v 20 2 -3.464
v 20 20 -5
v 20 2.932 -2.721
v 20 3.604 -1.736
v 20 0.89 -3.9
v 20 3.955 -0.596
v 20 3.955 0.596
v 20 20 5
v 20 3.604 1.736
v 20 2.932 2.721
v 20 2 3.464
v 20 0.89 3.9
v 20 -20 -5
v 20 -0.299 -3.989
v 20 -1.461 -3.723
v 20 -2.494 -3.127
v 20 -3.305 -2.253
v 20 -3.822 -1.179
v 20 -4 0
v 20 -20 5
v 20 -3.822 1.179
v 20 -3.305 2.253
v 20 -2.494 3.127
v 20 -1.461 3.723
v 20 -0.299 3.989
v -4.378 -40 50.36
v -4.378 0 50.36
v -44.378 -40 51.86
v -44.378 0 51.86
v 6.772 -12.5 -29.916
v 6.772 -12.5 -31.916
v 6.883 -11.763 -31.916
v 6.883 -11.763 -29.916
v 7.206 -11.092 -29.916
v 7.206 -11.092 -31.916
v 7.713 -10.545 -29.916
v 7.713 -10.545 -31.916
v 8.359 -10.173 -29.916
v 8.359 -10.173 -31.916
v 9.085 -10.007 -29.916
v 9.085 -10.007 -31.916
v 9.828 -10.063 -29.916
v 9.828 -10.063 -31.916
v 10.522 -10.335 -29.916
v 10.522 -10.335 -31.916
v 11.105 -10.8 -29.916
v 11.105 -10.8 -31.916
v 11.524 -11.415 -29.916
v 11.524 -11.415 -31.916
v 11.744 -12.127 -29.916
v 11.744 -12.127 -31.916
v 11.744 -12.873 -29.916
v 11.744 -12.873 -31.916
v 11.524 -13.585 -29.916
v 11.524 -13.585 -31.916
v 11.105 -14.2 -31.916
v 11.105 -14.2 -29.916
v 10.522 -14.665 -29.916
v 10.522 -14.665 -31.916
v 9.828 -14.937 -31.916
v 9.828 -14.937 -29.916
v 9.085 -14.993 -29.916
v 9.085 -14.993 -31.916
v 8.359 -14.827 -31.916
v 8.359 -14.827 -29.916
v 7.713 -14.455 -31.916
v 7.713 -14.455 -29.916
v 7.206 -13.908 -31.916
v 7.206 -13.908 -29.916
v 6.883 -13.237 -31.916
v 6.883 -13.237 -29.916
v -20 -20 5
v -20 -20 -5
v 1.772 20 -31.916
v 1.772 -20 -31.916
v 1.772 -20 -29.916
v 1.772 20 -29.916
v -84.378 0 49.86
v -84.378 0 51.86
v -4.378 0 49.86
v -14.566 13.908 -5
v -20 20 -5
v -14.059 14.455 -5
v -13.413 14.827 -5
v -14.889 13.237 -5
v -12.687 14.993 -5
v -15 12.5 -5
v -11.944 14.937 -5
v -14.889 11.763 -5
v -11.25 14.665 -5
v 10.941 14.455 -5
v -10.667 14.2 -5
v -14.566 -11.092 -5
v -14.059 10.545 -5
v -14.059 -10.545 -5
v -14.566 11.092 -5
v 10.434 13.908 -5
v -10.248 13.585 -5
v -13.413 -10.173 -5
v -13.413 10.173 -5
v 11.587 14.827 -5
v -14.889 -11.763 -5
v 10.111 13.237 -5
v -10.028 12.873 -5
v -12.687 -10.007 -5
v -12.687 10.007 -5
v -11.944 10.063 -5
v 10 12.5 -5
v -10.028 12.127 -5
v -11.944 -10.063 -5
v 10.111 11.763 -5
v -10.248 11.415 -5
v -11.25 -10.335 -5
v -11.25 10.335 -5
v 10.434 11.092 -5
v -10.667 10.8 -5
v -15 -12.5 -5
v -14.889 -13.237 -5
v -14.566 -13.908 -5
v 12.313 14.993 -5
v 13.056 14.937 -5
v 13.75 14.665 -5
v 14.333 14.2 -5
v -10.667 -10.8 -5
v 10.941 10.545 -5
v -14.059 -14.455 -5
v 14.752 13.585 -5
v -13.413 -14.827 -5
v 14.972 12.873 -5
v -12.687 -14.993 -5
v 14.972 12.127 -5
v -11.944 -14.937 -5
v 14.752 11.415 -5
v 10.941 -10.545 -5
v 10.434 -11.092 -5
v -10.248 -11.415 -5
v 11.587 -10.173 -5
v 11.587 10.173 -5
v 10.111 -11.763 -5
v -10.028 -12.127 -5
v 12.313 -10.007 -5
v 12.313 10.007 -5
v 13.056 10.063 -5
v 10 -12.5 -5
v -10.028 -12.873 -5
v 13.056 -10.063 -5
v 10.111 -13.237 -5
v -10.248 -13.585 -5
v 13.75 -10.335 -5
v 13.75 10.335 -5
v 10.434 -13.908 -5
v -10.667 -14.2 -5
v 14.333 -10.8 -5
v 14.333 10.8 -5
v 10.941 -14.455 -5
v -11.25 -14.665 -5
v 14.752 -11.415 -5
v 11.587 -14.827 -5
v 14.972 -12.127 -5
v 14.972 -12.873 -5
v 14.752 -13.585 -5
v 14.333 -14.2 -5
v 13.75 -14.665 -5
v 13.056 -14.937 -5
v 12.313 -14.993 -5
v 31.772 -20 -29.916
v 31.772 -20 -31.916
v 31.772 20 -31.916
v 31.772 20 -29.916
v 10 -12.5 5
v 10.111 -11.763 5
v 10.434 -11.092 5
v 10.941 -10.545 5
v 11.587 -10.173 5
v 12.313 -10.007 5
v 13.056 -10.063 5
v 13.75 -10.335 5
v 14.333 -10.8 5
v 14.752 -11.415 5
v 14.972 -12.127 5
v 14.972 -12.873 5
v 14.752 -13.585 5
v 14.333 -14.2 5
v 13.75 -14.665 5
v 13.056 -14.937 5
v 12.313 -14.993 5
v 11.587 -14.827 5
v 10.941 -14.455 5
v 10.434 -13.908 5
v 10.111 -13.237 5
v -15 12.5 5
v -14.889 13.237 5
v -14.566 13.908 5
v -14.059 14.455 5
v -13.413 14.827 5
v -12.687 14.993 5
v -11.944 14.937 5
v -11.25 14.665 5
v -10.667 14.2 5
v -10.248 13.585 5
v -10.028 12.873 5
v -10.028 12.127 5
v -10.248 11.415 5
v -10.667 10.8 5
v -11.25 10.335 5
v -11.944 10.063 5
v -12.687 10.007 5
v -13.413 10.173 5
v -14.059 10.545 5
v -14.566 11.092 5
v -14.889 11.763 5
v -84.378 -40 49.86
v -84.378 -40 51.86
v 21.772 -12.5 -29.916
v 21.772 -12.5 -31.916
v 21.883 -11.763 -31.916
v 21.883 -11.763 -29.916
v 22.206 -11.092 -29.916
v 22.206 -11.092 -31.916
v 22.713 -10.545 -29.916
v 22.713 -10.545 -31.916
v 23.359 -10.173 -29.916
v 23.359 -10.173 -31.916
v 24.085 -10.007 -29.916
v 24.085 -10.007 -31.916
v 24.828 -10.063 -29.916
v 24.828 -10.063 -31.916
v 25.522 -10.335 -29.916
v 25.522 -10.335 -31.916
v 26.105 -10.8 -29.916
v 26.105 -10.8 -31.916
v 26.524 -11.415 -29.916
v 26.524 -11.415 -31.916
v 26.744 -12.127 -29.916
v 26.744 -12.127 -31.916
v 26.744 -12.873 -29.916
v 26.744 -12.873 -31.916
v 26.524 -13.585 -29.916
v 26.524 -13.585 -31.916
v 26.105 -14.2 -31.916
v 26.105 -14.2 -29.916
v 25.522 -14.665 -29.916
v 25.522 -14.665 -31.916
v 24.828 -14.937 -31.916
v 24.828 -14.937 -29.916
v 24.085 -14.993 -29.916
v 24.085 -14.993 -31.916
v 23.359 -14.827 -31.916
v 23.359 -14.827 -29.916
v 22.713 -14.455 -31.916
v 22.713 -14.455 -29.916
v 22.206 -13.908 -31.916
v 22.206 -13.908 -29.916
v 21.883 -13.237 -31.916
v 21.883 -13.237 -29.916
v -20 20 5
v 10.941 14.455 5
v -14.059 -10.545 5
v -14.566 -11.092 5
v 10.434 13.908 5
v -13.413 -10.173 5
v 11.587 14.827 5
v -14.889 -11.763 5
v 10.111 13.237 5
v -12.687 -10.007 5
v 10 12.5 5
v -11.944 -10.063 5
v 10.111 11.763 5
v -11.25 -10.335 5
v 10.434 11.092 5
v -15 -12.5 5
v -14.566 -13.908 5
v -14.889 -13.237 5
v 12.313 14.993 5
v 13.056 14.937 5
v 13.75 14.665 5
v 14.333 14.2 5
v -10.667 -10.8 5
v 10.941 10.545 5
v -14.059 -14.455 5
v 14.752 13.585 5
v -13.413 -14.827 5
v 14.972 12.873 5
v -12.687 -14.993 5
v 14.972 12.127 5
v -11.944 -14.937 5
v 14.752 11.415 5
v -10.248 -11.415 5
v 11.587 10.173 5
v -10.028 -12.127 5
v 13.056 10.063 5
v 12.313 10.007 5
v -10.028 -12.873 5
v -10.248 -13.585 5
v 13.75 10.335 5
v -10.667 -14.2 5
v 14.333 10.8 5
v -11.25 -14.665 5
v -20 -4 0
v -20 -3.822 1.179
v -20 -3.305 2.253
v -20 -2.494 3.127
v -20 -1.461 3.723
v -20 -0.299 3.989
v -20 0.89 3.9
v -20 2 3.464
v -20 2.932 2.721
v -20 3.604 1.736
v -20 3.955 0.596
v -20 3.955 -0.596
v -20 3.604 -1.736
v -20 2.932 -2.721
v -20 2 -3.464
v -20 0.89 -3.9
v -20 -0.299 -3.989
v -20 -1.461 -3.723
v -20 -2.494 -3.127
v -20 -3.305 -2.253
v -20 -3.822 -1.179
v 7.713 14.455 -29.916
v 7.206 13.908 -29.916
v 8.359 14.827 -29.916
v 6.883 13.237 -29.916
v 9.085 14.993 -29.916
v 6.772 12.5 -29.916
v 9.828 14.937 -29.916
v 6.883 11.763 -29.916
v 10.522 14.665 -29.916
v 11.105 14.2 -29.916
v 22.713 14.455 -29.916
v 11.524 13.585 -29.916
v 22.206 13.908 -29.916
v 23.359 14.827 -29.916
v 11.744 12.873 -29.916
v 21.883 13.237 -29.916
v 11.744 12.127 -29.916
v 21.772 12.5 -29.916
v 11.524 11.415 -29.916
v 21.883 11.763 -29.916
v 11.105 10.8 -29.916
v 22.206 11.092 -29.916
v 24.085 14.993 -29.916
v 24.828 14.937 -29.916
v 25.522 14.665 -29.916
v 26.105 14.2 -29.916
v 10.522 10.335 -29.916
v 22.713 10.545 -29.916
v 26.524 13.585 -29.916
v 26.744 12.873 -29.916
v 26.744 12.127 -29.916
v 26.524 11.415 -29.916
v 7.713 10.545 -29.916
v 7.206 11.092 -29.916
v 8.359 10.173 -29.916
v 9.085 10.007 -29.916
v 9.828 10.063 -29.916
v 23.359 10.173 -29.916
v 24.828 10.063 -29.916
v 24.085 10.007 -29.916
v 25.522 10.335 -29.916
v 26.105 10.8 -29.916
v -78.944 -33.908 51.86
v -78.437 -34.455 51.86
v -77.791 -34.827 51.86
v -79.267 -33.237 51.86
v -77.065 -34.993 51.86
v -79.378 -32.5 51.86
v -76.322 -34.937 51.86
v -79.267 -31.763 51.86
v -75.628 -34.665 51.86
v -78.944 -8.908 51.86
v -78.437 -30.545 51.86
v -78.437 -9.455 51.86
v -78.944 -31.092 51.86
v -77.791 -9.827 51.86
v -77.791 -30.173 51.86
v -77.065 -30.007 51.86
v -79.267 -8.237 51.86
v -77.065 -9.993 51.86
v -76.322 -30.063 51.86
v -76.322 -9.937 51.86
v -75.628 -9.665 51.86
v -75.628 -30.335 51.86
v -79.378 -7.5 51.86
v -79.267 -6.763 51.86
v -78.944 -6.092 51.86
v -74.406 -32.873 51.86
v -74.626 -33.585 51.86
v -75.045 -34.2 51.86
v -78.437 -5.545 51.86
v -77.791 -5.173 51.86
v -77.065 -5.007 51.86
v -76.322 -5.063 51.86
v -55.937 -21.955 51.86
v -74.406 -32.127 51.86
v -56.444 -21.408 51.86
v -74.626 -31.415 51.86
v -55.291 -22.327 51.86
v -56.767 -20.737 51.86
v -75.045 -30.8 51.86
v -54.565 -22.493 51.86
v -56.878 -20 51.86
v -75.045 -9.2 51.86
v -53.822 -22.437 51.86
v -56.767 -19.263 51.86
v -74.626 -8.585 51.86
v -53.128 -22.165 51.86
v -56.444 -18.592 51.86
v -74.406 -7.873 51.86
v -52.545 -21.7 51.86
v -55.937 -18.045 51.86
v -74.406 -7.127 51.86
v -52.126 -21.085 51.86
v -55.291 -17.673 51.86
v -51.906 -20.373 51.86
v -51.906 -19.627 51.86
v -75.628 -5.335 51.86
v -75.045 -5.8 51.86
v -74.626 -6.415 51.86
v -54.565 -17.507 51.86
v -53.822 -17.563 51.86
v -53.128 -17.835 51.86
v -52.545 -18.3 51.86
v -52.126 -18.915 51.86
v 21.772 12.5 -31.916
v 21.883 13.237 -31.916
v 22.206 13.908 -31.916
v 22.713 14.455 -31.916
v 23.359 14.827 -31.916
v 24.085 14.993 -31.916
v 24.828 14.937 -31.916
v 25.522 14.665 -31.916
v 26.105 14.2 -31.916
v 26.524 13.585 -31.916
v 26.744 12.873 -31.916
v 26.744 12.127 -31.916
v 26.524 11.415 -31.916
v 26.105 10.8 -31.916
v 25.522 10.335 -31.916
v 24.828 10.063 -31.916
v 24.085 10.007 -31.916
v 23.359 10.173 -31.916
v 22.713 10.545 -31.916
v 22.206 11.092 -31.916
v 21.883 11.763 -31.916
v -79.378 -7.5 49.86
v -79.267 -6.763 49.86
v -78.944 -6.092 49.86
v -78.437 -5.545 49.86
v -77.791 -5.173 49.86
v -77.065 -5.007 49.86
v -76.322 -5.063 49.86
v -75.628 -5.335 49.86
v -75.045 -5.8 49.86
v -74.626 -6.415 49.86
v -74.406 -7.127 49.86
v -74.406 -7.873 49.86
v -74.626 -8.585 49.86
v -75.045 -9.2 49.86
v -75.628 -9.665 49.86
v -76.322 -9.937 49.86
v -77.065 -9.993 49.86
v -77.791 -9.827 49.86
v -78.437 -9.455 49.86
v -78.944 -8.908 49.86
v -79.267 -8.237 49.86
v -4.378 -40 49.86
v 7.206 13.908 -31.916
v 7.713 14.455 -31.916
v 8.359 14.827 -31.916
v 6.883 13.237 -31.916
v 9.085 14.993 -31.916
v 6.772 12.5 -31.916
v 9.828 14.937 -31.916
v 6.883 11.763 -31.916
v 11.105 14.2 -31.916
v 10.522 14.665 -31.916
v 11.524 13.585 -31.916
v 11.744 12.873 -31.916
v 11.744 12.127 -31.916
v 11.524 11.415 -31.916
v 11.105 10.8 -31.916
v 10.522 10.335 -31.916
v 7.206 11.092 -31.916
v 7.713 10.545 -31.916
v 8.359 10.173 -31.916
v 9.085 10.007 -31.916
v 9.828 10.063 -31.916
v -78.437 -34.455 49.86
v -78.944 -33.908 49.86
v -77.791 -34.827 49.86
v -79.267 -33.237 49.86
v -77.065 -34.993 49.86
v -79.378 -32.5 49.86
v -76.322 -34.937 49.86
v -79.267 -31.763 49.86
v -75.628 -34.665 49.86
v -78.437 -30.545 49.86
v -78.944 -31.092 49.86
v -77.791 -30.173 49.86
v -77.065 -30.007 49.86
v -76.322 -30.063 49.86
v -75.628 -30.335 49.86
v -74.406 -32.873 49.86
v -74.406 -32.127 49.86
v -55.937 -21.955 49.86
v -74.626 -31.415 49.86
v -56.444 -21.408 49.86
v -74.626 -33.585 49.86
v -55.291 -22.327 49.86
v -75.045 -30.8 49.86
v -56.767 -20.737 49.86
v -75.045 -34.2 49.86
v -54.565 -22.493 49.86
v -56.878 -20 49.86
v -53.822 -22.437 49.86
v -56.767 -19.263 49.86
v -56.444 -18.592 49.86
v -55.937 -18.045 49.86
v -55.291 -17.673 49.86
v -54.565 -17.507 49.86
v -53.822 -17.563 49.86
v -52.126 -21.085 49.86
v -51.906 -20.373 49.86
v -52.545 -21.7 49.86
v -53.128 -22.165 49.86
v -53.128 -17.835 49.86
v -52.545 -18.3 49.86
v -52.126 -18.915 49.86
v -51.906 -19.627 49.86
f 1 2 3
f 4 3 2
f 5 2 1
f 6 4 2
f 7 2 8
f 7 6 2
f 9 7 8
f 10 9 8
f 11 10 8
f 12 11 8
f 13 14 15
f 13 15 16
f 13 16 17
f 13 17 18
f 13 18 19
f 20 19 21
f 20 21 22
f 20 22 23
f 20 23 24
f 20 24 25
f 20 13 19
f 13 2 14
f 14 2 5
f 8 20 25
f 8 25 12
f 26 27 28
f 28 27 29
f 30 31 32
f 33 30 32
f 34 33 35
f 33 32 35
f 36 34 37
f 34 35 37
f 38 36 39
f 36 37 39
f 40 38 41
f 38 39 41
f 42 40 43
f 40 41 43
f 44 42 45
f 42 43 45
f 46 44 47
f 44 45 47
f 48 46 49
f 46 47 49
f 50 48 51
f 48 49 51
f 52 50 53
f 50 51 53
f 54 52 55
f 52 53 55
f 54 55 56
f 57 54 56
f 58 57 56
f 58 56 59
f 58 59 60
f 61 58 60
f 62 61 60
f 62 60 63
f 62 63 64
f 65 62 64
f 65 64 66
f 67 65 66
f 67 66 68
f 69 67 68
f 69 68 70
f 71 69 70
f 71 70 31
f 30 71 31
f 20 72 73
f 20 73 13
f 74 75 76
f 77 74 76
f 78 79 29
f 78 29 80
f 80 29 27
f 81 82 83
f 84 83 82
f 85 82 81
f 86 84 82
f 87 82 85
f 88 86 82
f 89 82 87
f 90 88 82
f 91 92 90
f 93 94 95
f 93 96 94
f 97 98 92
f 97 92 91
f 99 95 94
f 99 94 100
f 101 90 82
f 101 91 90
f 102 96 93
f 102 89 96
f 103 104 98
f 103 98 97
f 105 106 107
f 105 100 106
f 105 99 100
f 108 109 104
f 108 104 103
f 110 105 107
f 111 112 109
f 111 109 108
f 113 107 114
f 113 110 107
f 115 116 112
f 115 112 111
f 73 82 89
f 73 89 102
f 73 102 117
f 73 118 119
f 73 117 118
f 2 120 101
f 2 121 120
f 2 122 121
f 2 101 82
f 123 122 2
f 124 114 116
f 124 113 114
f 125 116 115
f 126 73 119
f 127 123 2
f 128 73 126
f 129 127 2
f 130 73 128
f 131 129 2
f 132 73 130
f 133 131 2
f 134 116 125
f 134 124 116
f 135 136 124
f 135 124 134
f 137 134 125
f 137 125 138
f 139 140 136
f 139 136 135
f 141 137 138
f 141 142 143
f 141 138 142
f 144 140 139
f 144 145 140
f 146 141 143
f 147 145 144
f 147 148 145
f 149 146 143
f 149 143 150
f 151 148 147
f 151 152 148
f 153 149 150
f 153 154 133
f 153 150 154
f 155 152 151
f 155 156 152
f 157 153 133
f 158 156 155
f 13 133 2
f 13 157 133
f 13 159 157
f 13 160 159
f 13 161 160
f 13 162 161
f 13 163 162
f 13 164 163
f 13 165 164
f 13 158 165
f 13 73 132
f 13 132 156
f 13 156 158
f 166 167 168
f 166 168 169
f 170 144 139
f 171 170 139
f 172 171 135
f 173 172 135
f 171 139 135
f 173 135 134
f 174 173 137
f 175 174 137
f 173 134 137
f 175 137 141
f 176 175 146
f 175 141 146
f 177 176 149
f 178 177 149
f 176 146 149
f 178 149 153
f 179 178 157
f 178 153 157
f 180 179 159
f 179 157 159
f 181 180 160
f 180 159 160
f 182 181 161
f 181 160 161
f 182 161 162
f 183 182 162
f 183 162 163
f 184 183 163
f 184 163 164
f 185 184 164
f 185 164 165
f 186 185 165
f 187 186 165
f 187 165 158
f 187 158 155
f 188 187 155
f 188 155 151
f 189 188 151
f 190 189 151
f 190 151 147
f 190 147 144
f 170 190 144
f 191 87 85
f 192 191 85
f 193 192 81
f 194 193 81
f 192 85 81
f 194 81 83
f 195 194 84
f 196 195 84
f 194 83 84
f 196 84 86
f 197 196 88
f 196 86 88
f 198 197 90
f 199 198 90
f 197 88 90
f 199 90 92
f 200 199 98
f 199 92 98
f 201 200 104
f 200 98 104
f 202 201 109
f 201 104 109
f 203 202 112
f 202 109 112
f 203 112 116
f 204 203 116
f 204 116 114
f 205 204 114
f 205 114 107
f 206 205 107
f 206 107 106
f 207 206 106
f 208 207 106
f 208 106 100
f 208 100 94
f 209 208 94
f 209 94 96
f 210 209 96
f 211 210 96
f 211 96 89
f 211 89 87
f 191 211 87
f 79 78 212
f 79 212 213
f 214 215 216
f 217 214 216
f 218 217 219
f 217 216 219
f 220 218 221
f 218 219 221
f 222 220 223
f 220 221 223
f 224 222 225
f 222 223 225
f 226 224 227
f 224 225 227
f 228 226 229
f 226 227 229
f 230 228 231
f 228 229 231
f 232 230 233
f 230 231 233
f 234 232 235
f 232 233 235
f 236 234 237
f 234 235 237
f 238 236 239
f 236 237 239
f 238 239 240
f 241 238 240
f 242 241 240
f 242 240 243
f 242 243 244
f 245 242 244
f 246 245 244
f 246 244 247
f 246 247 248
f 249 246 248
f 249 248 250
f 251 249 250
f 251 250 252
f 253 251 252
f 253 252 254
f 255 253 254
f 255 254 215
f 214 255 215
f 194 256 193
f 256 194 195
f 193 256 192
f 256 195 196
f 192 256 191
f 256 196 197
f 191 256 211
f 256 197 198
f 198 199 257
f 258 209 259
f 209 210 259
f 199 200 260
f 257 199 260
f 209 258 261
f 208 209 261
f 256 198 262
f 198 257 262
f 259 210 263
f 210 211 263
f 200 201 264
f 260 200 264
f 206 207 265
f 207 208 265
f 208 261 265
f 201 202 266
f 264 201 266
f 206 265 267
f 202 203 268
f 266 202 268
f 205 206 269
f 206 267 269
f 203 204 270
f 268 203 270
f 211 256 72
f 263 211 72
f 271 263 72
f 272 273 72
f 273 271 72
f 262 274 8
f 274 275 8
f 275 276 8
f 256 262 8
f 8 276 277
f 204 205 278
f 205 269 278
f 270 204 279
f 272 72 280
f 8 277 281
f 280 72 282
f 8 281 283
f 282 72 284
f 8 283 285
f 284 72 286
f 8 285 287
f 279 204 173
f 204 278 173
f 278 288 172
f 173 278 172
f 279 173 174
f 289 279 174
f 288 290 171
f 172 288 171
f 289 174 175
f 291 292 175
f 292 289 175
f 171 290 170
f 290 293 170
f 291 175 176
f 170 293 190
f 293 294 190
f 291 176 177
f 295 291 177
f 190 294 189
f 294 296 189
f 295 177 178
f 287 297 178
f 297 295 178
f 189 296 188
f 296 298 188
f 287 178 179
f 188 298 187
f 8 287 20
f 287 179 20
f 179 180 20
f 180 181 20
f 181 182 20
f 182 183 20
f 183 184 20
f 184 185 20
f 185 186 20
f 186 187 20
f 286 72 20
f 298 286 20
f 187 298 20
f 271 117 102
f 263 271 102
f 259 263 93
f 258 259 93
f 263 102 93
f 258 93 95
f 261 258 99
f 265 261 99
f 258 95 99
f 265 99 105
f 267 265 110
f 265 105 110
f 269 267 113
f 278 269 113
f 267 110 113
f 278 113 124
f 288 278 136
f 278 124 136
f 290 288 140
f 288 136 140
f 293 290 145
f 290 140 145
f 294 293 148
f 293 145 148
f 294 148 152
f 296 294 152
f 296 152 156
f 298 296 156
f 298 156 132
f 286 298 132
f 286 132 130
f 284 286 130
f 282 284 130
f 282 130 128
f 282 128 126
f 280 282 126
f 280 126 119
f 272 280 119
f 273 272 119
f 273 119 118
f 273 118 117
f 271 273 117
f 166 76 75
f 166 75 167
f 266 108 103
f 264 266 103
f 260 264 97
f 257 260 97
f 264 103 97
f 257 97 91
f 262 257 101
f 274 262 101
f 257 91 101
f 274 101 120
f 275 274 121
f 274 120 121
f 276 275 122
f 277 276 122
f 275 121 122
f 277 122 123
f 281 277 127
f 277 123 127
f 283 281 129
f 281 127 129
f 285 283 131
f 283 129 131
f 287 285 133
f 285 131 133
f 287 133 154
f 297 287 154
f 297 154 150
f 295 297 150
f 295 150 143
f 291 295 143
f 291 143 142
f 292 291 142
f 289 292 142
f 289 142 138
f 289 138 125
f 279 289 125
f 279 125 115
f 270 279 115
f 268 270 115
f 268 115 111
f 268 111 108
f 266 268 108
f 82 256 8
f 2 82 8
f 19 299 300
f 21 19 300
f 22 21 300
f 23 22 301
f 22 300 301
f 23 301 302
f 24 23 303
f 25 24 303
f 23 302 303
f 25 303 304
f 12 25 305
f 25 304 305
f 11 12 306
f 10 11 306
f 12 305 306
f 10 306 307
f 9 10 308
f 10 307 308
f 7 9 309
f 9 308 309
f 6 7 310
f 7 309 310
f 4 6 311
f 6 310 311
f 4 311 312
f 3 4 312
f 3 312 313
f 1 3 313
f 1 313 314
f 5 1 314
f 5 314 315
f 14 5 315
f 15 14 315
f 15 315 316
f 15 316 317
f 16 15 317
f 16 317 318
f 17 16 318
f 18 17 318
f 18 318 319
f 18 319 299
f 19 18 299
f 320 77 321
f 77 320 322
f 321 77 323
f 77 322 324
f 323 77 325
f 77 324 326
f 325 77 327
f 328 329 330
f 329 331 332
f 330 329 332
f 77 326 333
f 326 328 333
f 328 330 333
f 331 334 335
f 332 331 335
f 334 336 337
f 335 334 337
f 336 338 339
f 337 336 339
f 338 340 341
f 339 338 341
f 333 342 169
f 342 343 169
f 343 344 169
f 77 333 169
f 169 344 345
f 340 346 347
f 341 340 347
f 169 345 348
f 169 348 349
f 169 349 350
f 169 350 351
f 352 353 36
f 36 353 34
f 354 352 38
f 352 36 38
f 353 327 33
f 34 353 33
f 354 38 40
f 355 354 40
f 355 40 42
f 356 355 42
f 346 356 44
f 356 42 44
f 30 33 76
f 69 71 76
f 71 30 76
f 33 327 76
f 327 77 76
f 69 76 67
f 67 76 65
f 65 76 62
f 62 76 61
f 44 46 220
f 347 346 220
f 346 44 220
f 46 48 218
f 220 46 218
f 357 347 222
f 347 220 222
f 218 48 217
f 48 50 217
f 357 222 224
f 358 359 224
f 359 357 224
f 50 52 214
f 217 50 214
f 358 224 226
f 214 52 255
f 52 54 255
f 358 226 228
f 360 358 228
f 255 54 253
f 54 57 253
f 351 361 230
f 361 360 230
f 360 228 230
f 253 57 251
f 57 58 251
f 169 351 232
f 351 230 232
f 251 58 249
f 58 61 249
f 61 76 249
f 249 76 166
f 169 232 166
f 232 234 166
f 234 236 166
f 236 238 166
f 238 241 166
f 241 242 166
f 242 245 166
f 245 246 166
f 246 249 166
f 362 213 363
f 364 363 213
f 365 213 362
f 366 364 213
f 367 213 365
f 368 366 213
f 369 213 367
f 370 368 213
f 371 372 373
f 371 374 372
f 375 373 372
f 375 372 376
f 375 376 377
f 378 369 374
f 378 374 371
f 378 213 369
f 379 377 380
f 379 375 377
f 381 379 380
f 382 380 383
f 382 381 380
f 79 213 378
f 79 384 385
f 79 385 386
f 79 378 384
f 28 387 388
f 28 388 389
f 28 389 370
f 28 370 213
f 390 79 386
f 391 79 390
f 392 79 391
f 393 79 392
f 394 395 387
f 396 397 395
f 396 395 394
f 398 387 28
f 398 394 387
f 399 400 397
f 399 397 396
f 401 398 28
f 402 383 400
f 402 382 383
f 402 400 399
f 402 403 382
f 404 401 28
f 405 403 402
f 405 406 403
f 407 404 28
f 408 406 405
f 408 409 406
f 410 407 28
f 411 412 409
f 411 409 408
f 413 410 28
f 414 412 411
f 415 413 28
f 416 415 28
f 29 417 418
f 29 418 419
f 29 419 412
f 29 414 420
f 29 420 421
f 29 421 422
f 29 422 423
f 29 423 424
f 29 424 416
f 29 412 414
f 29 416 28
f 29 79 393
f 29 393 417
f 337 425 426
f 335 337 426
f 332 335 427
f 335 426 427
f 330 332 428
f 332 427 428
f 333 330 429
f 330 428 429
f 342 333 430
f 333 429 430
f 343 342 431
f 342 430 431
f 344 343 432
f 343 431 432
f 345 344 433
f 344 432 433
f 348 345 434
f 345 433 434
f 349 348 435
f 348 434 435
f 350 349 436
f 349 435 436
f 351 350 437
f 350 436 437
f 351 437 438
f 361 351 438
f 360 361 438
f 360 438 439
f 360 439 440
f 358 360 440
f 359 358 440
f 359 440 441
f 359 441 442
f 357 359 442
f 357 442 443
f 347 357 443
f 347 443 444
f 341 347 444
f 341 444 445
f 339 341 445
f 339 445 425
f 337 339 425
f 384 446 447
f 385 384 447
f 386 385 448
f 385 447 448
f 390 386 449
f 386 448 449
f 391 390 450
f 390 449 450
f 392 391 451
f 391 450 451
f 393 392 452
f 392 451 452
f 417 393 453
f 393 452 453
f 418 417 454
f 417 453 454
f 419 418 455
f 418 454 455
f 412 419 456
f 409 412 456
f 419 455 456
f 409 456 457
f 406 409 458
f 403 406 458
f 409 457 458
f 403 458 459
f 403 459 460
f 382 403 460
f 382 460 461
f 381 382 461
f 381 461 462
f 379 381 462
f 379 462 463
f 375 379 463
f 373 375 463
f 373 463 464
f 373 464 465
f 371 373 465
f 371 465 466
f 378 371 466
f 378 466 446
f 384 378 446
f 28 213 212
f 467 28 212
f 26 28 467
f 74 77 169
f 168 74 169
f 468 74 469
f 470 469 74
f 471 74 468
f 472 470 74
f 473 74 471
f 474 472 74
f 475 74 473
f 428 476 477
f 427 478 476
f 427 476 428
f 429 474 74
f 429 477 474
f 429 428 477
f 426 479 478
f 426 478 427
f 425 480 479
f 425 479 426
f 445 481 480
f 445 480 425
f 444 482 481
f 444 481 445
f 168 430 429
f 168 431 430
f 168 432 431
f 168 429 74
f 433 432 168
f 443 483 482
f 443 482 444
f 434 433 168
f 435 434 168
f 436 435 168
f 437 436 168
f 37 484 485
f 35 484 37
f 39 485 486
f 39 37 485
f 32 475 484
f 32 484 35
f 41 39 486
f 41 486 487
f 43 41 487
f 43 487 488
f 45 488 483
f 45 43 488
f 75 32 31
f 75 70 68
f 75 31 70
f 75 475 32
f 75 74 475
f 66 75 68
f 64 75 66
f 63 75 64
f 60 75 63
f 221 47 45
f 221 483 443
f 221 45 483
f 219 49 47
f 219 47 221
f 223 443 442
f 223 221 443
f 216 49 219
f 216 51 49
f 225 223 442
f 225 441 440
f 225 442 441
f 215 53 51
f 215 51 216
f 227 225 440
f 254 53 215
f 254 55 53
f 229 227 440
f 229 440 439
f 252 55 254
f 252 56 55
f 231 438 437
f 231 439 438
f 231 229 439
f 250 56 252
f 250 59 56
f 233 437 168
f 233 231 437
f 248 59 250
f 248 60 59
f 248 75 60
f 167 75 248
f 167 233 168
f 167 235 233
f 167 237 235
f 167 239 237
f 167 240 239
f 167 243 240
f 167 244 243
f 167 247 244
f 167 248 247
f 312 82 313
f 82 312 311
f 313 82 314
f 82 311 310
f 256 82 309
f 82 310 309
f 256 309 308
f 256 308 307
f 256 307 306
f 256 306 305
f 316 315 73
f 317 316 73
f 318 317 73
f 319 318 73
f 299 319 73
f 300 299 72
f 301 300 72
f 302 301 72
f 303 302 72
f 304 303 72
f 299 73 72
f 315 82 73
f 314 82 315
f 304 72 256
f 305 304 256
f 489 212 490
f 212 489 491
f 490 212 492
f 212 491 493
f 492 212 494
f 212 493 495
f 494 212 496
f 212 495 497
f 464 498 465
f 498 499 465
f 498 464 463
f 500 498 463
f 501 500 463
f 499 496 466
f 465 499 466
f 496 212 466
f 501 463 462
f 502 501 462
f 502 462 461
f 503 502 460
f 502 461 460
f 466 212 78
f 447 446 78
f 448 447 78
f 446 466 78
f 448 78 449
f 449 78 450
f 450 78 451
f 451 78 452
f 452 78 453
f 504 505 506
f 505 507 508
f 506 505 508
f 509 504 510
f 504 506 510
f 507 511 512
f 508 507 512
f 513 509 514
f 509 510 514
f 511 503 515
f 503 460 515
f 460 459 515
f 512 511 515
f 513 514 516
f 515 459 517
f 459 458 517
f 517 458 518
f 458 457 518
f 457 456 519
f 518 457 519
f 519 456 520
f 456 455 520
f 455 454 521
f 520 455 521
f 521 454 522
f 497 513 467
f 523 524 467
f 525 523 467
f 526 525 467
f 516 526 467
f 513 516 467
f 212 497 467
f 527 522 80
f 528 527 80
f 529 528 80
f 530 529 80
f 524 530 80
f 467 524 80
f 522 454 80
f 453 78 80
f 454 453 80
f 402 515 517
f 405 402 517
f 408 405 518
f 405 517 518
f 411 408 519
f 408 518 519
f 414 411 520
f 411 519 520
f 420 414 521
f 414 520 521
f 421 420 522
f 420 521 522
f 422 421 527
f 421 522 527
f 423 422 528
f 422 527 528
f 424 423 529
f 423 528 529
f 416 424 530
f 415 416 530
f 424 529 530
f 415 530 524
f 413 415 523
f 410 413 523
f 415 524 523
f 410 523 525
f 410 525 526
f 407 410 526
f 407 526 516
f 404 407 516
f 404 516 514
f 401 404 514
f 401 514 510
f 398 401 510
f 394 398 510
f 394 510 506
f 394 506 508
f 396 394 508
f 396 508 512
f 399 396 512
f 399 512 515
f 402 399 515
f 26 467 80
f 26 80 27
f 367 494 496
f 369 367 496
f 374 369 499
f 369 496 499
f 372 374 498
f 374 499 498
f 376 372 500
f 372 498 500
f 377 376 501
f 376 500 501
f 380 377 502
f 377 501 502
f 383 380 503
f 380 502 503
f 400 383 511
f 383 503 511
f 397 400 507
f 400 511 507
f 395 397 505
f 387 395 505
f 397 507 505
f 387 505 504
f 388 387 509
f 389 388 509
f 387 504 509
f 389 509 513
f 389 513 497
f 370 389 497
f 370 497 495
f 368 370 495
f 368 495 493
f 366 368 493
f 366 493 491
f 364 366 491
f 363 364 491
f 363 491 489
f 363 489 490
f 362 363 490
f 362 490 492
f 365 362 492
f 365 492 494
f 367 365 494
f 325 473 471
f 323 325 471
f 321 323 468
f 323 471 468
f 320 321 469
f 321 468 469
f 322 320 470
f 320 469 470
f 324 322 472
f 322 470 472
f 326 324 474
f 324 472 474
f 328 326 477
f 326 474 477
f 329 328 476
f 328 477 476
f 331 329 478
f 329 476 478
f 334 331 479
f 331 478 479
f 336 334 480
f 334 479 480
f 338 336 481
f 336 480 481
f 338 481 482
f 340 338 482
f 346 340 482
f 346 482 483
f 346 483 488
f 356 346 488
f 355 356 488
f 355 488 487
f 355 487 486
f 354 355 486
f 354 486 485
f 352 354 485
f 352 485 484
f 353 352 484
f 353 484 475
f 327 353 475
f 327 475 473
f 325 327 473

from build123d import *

# Parameters (mm, degrees)
F0_W      = 40
F0_H      = 10
F1_DEPTH  = 20
F3_D      = 8
F5_D      = 5
F6_W      = 30
F6_H      = 2
F7_DEPTH  = 20
F9_D      = 5
F10_W     = 40
F10_H     = 2
F11_DEPTH = 40
F13_D     = 5


with BuildPart() as f1:
    # F0 (on Front) → F1 (new body, symmetric)
    with BuildSketch(Plane.XZ):
        Rectangle(F0_W, F0_H)
    extrude(amount=F1_DEPTH, both=True)

    # F3 (through all)
    with Locations(Plane.YZ.offset(20)):
        with Locations((0, 0)):
            Hole(F3_D / 2)

    # F5 (through all)
    with Locations(Plane.XY.offset(5)):
        with Locations((12.5, 12.5), (-12.5, 12.5), (-12.5, -12.5), (12.5, -12.5)):
            Hole(F5_D / 2)


with BuildPart() as f7:
    # F6 (on Front) → F7 (new body, symmetric)
    with BuildSketch(Plane.XZ):
        with Locations((16.772058, -30.915891)):
            Rectangle(F6_W, F6_H)
    extrude(amount=F7_DEPTH, both=True)

    # F9 (through all)
    with Locations(Plane.XY.offset(-29.915891)):
        with Locations((9.272058, 12.5), (9.272058, -12.5), (24.272058, -12.5), (24.272058, 12.5)):
            Hole(F9_D / 2)


with BuildPart() as f11:
    # F10 (on Front) → F11 (new body)
    with BuildSketch(Plane.XZ):
        with Locations((-64.377942, 50.859711)):
            Rectangle(F10_W, F10_H)
        Polygon((-44.377942, 51.859711), (-44.377942, 49.859711), (-4.377942, 49.859711), (-4.377942, 50.359711), align=None)
    extrude(amount=F11_DEPTH)

    # F13 (through all)
    with Locations(Plane.XY.offset(51.859711)):
        with Locations((-76.877942, -7.5), (-76.877942, -32.5), (-54.377942, -20)):
            Hole(F13_D / 2)


solid = Compound([f1.part, f7.part, f11.part])
